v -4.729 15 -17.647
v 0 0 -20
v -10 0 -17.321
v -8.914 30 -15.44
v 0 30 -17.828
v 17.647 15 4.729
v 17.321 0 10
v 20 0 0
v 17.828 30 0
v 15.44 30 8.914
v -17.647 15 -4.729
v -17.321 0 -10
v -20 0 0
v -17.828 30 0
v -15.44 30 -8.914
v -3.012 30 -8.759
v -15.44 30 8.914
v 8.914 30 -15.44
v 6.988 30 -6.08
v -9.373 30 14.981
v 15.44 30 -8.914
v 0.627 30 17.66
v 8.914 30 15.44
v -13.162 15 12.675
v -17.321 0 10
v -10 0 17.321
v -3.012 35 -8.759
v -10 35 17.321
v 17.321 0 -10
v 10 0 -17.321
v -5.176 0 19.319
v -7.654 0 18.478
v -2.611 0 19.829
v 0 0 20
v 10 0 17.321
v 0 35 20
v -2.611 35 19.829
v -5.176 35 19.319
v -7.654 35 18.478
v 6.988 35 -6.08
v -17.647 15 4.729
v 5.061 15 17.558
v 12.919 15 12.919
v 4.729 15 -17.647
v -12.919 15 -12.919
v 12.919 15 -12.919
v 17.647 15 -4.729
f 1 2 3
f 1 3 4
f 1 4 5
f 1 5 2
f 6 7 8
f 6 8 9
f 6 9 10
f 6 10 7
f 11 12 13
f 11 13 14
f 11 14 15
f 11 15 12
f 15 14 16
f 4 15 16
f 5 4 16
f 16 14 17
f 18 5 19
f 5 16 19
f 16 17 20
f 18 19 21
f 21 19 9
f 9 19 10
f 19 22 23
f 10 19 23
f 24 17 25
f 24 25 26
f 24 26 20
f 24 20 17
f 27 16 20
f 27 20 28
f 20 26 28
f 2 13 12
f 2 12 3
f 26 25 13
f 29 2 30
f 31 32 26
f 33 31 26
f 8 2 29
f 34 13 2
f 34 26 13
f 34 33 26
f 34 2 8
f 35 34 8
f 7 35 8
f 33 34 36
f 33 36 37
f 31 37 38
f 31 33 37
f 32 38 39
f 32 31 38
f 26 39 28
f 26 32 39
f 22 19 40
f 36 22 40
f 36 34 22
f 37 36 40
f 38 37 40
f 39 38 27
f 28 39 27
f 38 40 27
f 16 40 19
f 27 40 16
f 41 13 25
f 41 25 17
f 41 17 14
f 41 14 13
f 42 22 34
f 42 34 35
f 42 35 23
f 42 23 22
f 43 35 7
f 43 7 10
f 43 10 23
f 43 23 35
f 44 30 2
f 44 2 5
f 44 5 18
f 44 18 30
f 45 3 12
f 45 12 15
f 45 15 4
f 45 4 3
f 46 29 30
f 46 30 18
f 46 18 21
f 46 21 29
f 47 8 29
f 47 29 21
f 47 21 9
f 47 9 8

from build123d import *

# Parameters (mm, degrees)
BOSS_EXTRUDE1_DEPTH = 30
BOSS_EXTRUDE1_TAPER = 4
BOSS_EXTRUDE2_DEPTH = 35
SKETCH5_W           = 10.352761804
SKETCH5_H           = 35
BOSS_EXTRUDE3_DEPTH = 27


with BuildPart() as part:
    # Sketch1 → Boss-Extrude1 (new body)
    with BuildSketch(Plane(origin=(0, 0, 0), x_dir=(1, 0, 0), z_dir=(0, 1, 0))):
        Polygon((-20, 0), (-17.320508076, -10), (-10, -17.320508076), (0, -20), (10, -17.320508076), (17.320508076, -10), (20, 0), (17.320508076, 10), (10, 17.320508076), (0, 20), (-10, 17.320508076), (-17.320508076, 10), align=None)
    extrude(amount=BOSS_EXTRUDE1_DEPTH, taper=BOSS_EXTRUDE1_TAPER)



with BuildPart() as body_2:
    # Sketch3 → Boss-Extrude2 (new body)
    with BuildSketch(Plane(origin=(0, 0, 0), x_dir=(-1, 0, 0), z_dir=(0, -1, 0))):
        with BuildLine():
            Line((10, -17.320508076), (0, -20))
            ThreePointArc((0, -20), (5.176380902, -19.318516526), (10, -17.320508076))
        make_face()
    extrude(amount=-BOSS_EXTRUDE2_DEPTH)


with BuildPart() as part_1:
    add(part.part)

    add(body_2.part)  # Boss-Extrude3 merges body 2
    # Sketch5 → Boss-Extrude3 (add)
    with BuildSketch(Plane(origin=(-5, 0, 18.660254038), x_dir=(-0.9659258262890708, 0, -0.2588190451025115), z_dir=(0.2588190451025115, 0, -0.9659258262890709))):
        with Locations((0, 17.5)):
            Rectangle(SKETCH5_W, SKETCH5_H)
    extrude(amount=BOSS_EXTRUDE3_DEPTH)


solid = part_1.part
